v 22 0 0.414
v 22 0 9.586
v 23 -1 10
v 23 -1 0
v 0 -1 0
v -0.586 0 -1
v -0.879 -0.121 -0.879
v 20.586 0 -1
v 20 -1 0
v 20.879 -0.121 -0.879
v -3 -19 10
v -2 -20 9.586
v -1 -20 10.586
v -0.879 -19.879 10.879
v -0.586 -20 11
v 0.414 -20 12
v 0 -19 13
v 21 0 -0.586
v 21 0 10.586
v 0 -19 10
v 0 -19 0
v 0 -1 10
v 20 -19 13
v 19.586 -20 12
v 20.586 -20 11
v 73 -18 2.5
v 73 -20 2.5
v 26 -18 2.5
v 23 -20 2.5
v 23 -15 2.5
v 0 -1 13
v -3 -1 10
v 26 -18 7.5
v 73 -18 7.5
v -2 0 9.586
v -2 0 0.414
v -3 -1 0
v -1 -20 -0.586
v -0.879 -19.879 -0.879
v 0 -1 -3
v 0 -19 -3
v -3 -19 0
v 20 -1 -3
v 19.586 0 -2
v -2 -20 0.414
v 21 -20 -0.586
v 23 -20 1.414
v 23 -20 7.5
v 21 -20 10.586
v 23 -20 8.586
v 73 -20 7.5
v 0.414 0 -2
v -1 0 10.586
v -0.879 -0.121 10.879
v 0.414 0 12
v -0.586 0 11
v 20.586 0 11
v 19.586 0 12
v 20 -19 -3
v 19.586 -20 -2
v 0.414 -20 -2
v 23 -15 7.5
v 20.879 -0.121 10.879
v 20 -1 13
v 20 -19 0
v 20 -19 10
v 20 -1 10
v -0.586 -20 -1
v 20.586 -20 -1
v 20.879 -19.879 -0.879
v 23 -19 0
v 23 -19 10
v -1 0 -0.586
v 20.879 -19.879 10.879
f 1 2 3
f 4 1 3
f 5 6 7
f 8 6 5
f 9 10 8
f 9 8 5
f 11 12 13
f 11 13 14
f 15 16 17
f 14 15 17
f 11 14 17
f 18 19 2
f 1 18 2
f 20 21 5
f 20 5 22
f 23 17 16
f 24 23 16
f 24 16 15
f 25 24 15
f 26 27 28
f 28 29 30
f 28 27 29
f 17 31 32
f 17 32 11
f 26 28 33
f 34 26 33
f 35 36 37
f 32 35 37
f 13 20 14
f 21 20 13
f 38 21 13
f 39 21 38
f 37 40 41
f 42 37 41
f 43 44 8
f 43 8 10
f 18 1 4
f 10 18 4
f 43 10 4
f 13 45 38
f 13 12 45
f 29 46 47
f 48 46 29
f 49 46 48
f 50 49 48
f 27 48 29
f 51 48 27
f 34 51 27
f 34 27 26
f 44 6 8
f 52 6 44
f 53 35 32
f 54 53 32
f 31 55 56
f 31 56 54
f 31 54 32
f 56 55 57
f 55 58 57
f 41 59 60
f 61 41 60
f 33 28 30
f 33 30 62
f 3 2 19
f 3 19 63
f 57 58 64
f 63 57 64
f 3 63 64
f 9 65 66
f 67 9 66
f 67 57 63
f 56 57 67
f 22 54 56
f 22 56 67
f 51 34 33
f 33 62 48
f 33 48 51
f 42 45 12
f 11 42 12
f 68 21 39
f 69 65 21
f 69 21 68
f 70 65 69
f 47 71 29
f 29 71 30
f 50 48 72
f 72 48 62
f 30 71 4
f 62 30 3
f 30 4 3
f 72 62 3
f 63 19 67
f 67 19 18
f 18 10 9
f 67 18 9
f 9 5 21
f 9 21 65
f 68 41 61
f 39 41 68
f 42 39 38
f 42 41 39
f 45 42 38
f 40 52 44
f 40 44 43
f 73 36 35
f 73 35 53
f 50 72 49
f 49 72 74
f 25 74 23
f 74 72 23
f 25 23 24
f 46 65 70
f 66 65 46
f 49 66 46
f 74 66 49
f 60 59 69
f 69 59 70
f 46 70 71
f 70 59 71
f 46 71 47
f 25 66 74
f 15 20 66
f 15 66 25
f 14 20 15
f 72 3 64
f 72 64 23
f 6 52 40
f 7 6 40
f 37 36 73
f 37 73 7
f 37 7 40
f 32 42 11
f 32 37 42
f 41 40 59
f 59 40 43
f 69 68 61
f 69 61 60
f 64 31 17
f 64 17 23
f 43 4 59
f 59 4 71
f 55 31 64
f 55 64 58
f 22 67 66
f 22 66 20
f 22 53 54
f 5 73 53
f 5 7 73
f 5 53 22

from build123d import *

# Parameters (mm, degrees)
F0_W         = 26
F0_H         = 16
F0_W_2       = 20
F0_H_2       = 10
F1_DEPTH     = 20
F3_DEPTH     = 50
F4_SIZE      = 3
F5_T1_DEPTH  = 10
F5_T3_DEPTH  = 20
F5_T5_DEPTH  = 9.3860066631
F5_T7_DEPTH  = 9.3860066631
F5_T9_DEPTH  = 9.3860066631
F5_T11_DEPTH = 9.3860066631
F5_T13_DEPTH = 25.1433659759
F5_T15_DEPTH = 15.1433659759
F5_T21_DEPTH = 22.571682988
F5_T25_DEPTH = 12.571682988
F5_T32_DEPTH = 22.571682988
F5_T36_DEPTH = 12.571682988
F5_T43_DEPTH = 12.571682988
F5_T47_DEPTH = 22.571682988
F5_T54_DEPTH = 22.571682988
F5_T58_DEPTH = 12.571682988
F6_T1_DEPTH  = 9.3860066631
F6_T3_DEPTH  = 10
F6_T5_DEPTH  = 9.3860066631
F6_T7_DEPTH  = 25.1433659759
F6_T9_DEPTH  = 20
F6_T14_DEPTH = 9.3860066631
F6_T19_DEPTH = 9.3860066631
F6_T25_DEPTH = 22.571682988
F6_T30_DEPTH = 12.571682988
F6_T38_DEPTH = 22.571682988
F6_T43_DEPTH = 12.571682988
F6_T51_DEPTH = 22.571682988
F6_T56_DEPTH = 12.571682988
F6_T64_DEPTH = 12.571682988
F6_T69_DEPTH = 22.571682988
F7_SIZE      = 1


# Not quite as in the source:
# - a fillet or chamfer that OpenCascade refuses, or shapes differently, is made with other operations: its cross-section is extruded or revolved along the edge and cut away or added


with BuildPart() as f1:
    # F0 (on Front) → F1 (new body)
    with BuildSketch(Plane.XZ):
        with Locations((10, 5)):
            Rectangle(F0_W, F0_H)
        with Locations((10, 5)):
            Rectangle(F0_W_2, F0_H_2, mode=Mode.SUBTRACT)
    extrude(amount=F1_DEPTH)

    # F2 (on face) → F3 (join)
    with BuildSketch(Plane.YZ.offset(23)):
        Polygon((-18, 2.5), (-18, 5), (-18, 7.5), (-20, 7.5), (-20, 5), (-20, 2.5), align=None)
    extrude(amount=F3_DEPTH)

    # F4
    f4_edges = [f1.edges().sort_by_distance(p)[0] for p in [
        (-3, -10, 13),
        (23, -10, 13),
        (23, -18, 5),
        (-3, -10, -3),
        (23, -10, -3),
    ]]
    chamfer(f4_edges, length=F4_SIZE)

    # F5: chamfer of 1 on 12 edges, made by hand

    # F5_s2 → F5_t1 (cut)
    with BuildSketch(Plane.XY):
        Polygon((21, 0), (20, -1), (20, 0), align=None)
        Polygon((-1, 0), (0, -1), (0, 0), align=None)
    extrude(amount=F5_T1_DEPTH, mode=Mode.SUBTRACT)

    # F5_s4 → F5_t3 (cut)
    with BuildSketch(Plane.YZ):
        Polygon((0, 11), (-1, 10), (0, 10), align=None)
        Polygon((0, -1), (-1, 0), (0, 0), align=None)
    extrude(amount=F5_T3_DEPTH, mode=Mode.SUBTRACT)

    # F5_s6 → F5_t5 (cut)
    with BuildSketch(Plane(origin=(-3.3184544799, 0, 3.3184544799), x_dir=(0, 1, 0), z_dir=(0.7071067812, 0, -0.7071067812))):
        Polygon((0, -1.1213203436), (-1, -2.1213203436), (0, -2.1213203436), align=None)
    extrude(amount=F5_T5_DEPTH, mode=Mode.SUBTRACT)

    # F5_s8 → F5_t7 (cut)
    with BuildSketch(Plane(origin=(13.3184544799, 0, 13.3184544799), x_dir=(0, 1, 0), z_dir=(-0.7071067812, 0, -0.7071067812))):
        Polygon((0, 15.2634559673), (-1, 16.2634559673), (0, 16.2634559673), align=None)
    extrude(amount=F5_T7_DEPTH, mode=Mode.SUBTRACT)

    # F5_s10 → F5_t9 (cut)
    with BuildSketch(Plane(origin=(1.6815455201, 0, -1.6815455201), x_dir=(0, 1, 0), z_dir=(0.7071067812, 0, -0.7071067812))):
        Polygon((0, 22.3345237792), (-1, 23.3345237792), (0, 23.3345237792), align=None)
    extrude(amount=F5_T9_DEPTH, mode=Mode.SUBTRACT)

    # F5_s12 → F5_t11 (cut)
    with BuildSketch(Plane(origin=(8.3184544799, 0, 8.3184544799), x_dir=(0, 1, 0), z_dir=(-0.7071067812, 0, -0.7071067812))):
        Polygon((0, -8.1923881554), (-1, -9.1923881554), (0, -9.1923881554), align=None)
    extrude(amount=F5_T11_DEPTH, mode=Mode.SUBTRACT)

    # F5_s14 → F5_t13 (cut)
    with BuildSketch(Plane.YZ.offset(-2.571682988)):
        Polygon((0, -2), (-1, -3), (0, -3), align=None)
        Polygon((-1, 13), (0, 12), (0, 13), align=None)
    extrude(amount=F5_T13_DEPTH, mode=Mode.SUBTRACT)

    # F5_s16 → F5_t15 (cut)
    with BuildSketch(Plane.XY.offset(-2.571682988)):
        Polygon((22, 0), (23, -1), (23, 0), align=None)
        Polygon((-2, 0), (-3, -1), (-3, 0), align=None)
    extrude(amount=F5_T15_DEPTH, mode=Mode.SUBTRACT)


with BuildPart() as f5_tool19:
    # F5_s20 → F5_t21 (new body)
    with BuildSketch(Plane.YZ):
        Polygon((0, 11), (-1, 10), (0, 10), align=None)
    extrude(amount=F5_T21_DEPTH)

    split(bisect_by=Plane.YZ.offset(20), keep=Keep.TOP)


with BuildPart() as f5_tool23:
    # F5_s24 → F5_t25 (new body)
    with BuildSketch(Plane.XY.offset(12.571682988)):
        Polygon((21, 0), (20, -1), (20, 0), align=None)
    extrude(amount=-F5_T25_DEPTH)

    split(bisect_by=Plane.XY.offset(10), keep=Keep.TOP)


with BuildPart() as f5_tool19_1:
    add(f5_tool19.part)

    # F5_t27: intersect F5_tool23
    add(f5_tool23.part, mode=Mode.INTERSECT)


with BuildPart() as f1_1:
    add(f1.part)

    # F5_t17: cut F5_tool19
    add(f5_tool19_1.part, mode=Mode.SUBTRACT)


with BuildPart() as f5_tool30:
    # F5_s31 → F5_t32 (new body)
    with BuildSketch(Plane.YZ.offset(22.571682988)):
        Polygon((0, -1), (-1, 0), (0, 0), align=None)
    extrude(amount=-F5_T32_DEPTH)

    split(bisect_by=Plane.YZ.offset(20), keep=Keep.TOP)


with BuildPart() as f5_tool34:
    # F5_s35 → F5_t36 (new body)
    with BuildSketch(Plane.XY.offset(10)):
        Polygon((21, 0), (20, -1), (20, 0), align=None)
    extrude(amount=-F5_T36_DEPTH)

    split(bisect_by=Plane.XY, keep=Keep.BOTTOM)


with BuildPart() as f5_tool30_1:
    add(f5_tool30.part)

    # F5_t38: intersect F5_tool34
    add(f5_tool34.part, mode=Mode.INTERSECT)


with BuildPart() as f1_2:
    add(f1_1.part)

    # F5_t28: cut F5_tool30
    add(f5_tool30_1.part, mode=Mode.SUBTRACT)


with BuildPart() as f5_tool41:
    # F5_s42 → F5_t43 (new body)
    with BuildSketch(Plane.XY):
        Polygon((-1, 0), (0, -1), (0, 0), align=None)
    extrude(amount=F5_T43_DEPTH)

    split(bisect_by=Plane.XY.offset(10), keep=Keep.TOP)


with BuildPart() as f5_tool45:
    # F5_s46 → F5_t47 (new body)
    with BuildSketch(Plane.YZ.offset(-2.571682988)):
        Polygon((0, 11), (-1, 10), (0, 10), align=None)
    extrude(amount=F5_T47_DEPTH)

    split(bisect_by=Plane.YZ, keep=Keep.BOTTOM)


with BuildPart() as f5_tool41_1:
    add(f5_tool41.part)

    # F5_t49: intersect F5_tool45
    add(f5_tool45.part, mode=Mode.INTERSECT)


with BuildPart() as f1_3:
    add(f1_2.part)

    # F5_t39: cut F5_tool41
    add(f5_tool41_1.part, mode=Mode.SUBTRACT)


with BuildPart() as f5_tool52:
    # F5_s53 → F5_t54 (new body)
    with BuildSketch(Plane.YZ.offset(20)):
        Polygon((0, -1), (-1, 0), (0, 0), align=None)
    extrude(amount=-F5_T54_DEPTH)

    split(bisect_by=Plane.YZ, keep=Keep.BOTTOM)


with BuildPart() as f5_tool56:
    # F5_s57 → F5_t58 (new body)
    with BuildSketch(Plane.XY.offset(-2.571682988)):
        Polygon((-1, 0), (0, -1), (0, 0), align=None)
    extrude(amount=F5_T58_DEPTH)

    split(bisect_by=Plane.XY, keep=Keep.BOTTOM)


with BuildPart() as f5_tool52_1:
    add(f5_tool52.part)

    # F5_t60: intersect F5_tool56
    add(f5_tool56.part, mode=Mode.INTERSECT)


with BuildPart() as f1_4:
    add(f1_3.part)

    # F5_t50: cut F5_tool52
    add(f5_tool52_1.part, mode=Mode.SUBTRACT)

    # F6: chamfer of 1 on 10 edges, made by hand

    # F6_s2 → F6_t1 (cut)
    with BuildSketch(Plane(origin=(-3.3184544799, 0, 3.3184544799), x_dir=(0, 1, 0), z_dir=(0.7071067812, 0, -0.7071067812))):
        Polygon((-19, -2.1213203436), (-20, -1.1213203436), (-20, -2.1213203436), align=None)
    extrude(amount=F6_T1_DEPTH, mode=Mode.SUBTRACT)

    # F6_s4 → F6_t3 (cut)
    with BuildSketch(Plane.XY):
        Polygon((0, -19), (-1, -20), (0, -20), align=None)
        Polygon((20, -19), (21, -20), (20, -20), align=None)
    extrude(amount=F6_T3_DEPTH, mode=Mode.SUBTRACT)

    # F6_s6 → F6_t5 (cut)
    with BuildSketch(Plane(origin=(8.3184544799, 0, 8.3184544799), x_dir=(0, 1, 0), z_dir=(-0.7071067812, 0, -0.7071067812))):
        Polygon((-20, -8.1923881554), (-19, -9.1923881554), (-20, -9.1923881554), align=None)
    extrude(amount=F6_T5_DEPTH, mode=Mode.SUBTRACT)

    # F6_s8 → F6_t7 (cut)
    with BuildSketch(Plane.YZ.offset(-2.571682988)):
        Polygon((-19, -3), (-20, -2), (-20, -3), align=None)
        Polygon((-19, 13), (-20, 12), (-20, 13), align=None)
    extrude(amount=F6_T7_DEPTH, mode=Mode.SUBTRACT)

    # F6_s10 → F6_t9 (cut)
    with BuildSketch(Plane.YZ):
        Polygon((-19, 0), (-20, -1), (-20, 0), align=None)
        Polygon((-19, 10), (-20, 11), (-20, 10), align=None)
    extrude(amount=F6_T9_DEPTH, mode=Mode.SUBTRACT)


with BuildPart() as f6_tool12:
    # F6_s13 → F6_t14 (new body)
    with BuildSketch(Plane(origin=(1.6815455201, 0, -1.6815455201), x_dir=(0, 1, 0), z_dir=(0.7071067812, 0, -0.7071067812))):
        Polygon((-19, 23.3345237792), (-20, 22.3345237792), (-20, 23.3345237792), align=None)
    extrude(amount=F6_T14_DEPTH)

    split(bisect_by=Plane.XY.offset(7.5), keep=Keep.TOP)


with BuildPart() as f1_5:
    add(f1_4.part)

    # F6_t11: cut F6_tool12
    add(f6_tool12.part, mode=Mode.SUBTRACT)


with BuildPart() as f6_tool17:
    # F6_s18 → F6_t19 (new body)
    with BuildSketch(Plane(origin=(13.3184544799, 0, 13.3184544799), x_dir=(0, 1, 0), z_dir=(-0.7071067812, 0, -0.7071067812))):
        Polygon((-19, 16.2634559673), (-20, 15.2634559673), (-20, 16.2634559673), align=None)
    extrude(amount=F6_T19_DEPTH)

    split(bisect_by=Plane.XY.offset(2.5), keep=Keep.BOTTOM)


with BuildPart() as f1_6:
    add(f1_5.part)

    # F6_t16: cut F6_tool17
    add(f6_tool17.part, mode=Mode.SUBTRACT)


with BuildPart() as f6_tool23:
    # F6_s24 → F6_t25 (new body)
    with BuildSketch(Plane.YZ.offset(20)):
        Polygon((-19, 0), (-20, -1), (-20, 0), align=None)
    extrude(amount=-F6_T25_DEPTH)

    split(bisect_by=Plane(origin=(-1.5, 0, -1.5), x_dir=(0, 1, 0), z_dir=(0.7071067812, 0, 0.7071067812)), keep=Keep.TOP)

    split(bisect_by=Plane.YZ, keep=Keep.BOTTOM)


with BuildPart() as f6_tool28:
    # F6_s29 → F6_t30 (new body)
    with BuildSketch(Plane.XY.offset(-2.571682988)):
        Polygon((0, -19), (-1, -20), (0, -20), align=None)
    extrude(amount=F6_T30_DEPTH)

    split(bisect_by=Plane(origin=(-1.5, 0, -1.5), x_dir=(0, 1, 0), z_dir=(0.7071067812, 0, 0.7071067812)), keep=Keep.TOP)

    split(bisect_by=Plane.XY, keep=Keep.BOTTOM)


with BuildPart() as f6_tool23_1:
    add(f6_tool23.part)

    # F6_t33: intersect F6_tool28
    add(f6_tool28.part, mode=Mode.INTERSECT)


with BuildPart() as f1_7:
    add(f1_6.part)

    # F6_t21: cut F6_tool23
    add(f6_tool23_1.part, mode=Mode.SUBTRACT)


with BuildPart() as f6_tool36:
    # F6_s37 → F6_t38 (new body)
    with BuildSketch(Plane.YZ.offset(-2.571682988)):
        Polygon((-19, 10), (-20, 11), (-20, 10), align=None)
    extrude(amount=F6_T38_DEPTH)

    split(bisect_by=Plane.YZ, keep=Keep.BOTTOM)

    split(bisect_by=Plane(origin=(-6.5, 0, 6.5), x_dir=(0, 1, 0), z_dir=(0.7071067812, 0, -0.7071067812)), keep=Keep.TOP)


with BuildPart() as f6_tool41:
    # F6_s42 → F6_t43 (new body)
    with BuildSketch(Plane.XY):
        Polygon((0, -19), (-1, -20), (0, -20), align=None)
    extrude(amount=F6_T43_DEPTH)

    split(bisect_by=Plane.XY.offset(10), keep=Keep.TOP)

    split(bisect_by=Plane(origin=(-6.5, 0, 6.5), x_dir=(0, 1, 0), z_dir=(0.7071067812, 0, -0.7071067812)), keep=Keep.TOP)


with BuildPart() as f6_tool36_1:
    add(f6_tool36.part)

    # F6_t46: intersect F6_tool41
    add(f6_tool41.part, mode=Mode.INTERSECT)


with BuildPart() as f1_8:
    add(f1_7.part)

    # F6_t34: cut F6_tool36
    add(f6_tool36_1.part, mode=Mode.SUBTRACT)


with BuildPart() as f6_tool49:
    # F6_s50 → F6_t51 (new body)
    with BuildSketch(Plane.YZ.offset(22.571682988)):
        Polygon((-19, 0), (-20, -1), (-20, 0), align=None)
    extrude(amount=-F6_T51_DEPTH)

    split(bisect_by=Plane(origin=(11.5, 0, -11.5), x_dir=(0, 1, 0), z_dir=(-0.7071067812, 0, 0.7071067812)), keep=Keep.TOP)

    split(bisect_by=Plane.YZ.offset(20), keep=Keep.TOP)


with BuildPart() as f6_tool54:
    # F6_s55 → F6_t56 (new body)
    with BuildSketch(Plane.XY.offset(10)):
        Polygon((20, -19), (21, -20), (20, -20), align=None)
    extrude(amount=-F6_T56_DEPTH)

    split(bisect_by=Plane(origin=(11.5, 0, -11.5), x_dir=(0, 1, 0), z_dir=(-0.7071067812, 0, 0.7071067812)), keep=Keep.TOP)

    split(bisect_by=Plane.XY, keep=Keep.BOTTOM)


with BuildPart() as f6_tool49_1:
    add(f6_tool49.part)

    # F6_t59: intersect F6_tool54
    add(f6_tool54.part, mode=Mode.INTERSECT)


with BuildPart() as f1_9:
    add(f1_8.part)

    # F6_t47: cut F6_tool49
    add(f6_tool49_1.part, mode=Mode.SUBTRACT)


with BuildPart() as f6_tool62:
    # F6_s63 → F6_t64 (new body)
    with BuildSketch(Plane.XY.offset(12.571682988)):
        Polygon((20, -19), (21, -20), (20, -20), align=None)
    extrude(amount=-F6_T64_DEPTH)

    split(bisect_by=Plane(origin=(16.5, 0, 16.5), x_dir=(0, 1, 0), z_dir=(-0.7071067812, 0, -0.7071067812)), keep=Keep.TOP)

    split(bisect_by=Plane.XY.offset(10), keep=Keep.TOP)


with BuildPart() as f6_tool67:
    # F6_s68 → F6_t69 (new body)
    with BuildSketch(Plane.YZ):
        Polygon((-19, 10), (-20, 11), (-20, 10), align=None)
    extrude(amount=F6_T69_DEPTH)

    split(bisect_by=Plane(origin=(16.5, 0, 16.5), x_dir=(0, 1, 0), z_dir=(-0.7071067812, 0, -0.7071067812)), keep=Keep.TOP)

    split(bisect_by=Plane.YZ.offset(20), keep=Keep.TOP)


with BuildPart() as f6_tool62_1:
    add(f6_tool62.part)

    # F6_t72: intersect F6_tool67
    add(f6_tool67.part, mode=Mode.INTERSECT)


with BuildPart() as f1_10:
    add(f1_9.part)

    # F6_t60: cut F6_tool62
    add(f6_tool62_1.part, mode=Mode.SUBTRACT)

    # F7
    f7_edges = [f1_10.edges().sort_by_distance(p)[0] for p in [
        (-3, -20, 5),
    ]]
    chamfer(f7_edges, length=F7_SIZE)


solid = f1_10.part
